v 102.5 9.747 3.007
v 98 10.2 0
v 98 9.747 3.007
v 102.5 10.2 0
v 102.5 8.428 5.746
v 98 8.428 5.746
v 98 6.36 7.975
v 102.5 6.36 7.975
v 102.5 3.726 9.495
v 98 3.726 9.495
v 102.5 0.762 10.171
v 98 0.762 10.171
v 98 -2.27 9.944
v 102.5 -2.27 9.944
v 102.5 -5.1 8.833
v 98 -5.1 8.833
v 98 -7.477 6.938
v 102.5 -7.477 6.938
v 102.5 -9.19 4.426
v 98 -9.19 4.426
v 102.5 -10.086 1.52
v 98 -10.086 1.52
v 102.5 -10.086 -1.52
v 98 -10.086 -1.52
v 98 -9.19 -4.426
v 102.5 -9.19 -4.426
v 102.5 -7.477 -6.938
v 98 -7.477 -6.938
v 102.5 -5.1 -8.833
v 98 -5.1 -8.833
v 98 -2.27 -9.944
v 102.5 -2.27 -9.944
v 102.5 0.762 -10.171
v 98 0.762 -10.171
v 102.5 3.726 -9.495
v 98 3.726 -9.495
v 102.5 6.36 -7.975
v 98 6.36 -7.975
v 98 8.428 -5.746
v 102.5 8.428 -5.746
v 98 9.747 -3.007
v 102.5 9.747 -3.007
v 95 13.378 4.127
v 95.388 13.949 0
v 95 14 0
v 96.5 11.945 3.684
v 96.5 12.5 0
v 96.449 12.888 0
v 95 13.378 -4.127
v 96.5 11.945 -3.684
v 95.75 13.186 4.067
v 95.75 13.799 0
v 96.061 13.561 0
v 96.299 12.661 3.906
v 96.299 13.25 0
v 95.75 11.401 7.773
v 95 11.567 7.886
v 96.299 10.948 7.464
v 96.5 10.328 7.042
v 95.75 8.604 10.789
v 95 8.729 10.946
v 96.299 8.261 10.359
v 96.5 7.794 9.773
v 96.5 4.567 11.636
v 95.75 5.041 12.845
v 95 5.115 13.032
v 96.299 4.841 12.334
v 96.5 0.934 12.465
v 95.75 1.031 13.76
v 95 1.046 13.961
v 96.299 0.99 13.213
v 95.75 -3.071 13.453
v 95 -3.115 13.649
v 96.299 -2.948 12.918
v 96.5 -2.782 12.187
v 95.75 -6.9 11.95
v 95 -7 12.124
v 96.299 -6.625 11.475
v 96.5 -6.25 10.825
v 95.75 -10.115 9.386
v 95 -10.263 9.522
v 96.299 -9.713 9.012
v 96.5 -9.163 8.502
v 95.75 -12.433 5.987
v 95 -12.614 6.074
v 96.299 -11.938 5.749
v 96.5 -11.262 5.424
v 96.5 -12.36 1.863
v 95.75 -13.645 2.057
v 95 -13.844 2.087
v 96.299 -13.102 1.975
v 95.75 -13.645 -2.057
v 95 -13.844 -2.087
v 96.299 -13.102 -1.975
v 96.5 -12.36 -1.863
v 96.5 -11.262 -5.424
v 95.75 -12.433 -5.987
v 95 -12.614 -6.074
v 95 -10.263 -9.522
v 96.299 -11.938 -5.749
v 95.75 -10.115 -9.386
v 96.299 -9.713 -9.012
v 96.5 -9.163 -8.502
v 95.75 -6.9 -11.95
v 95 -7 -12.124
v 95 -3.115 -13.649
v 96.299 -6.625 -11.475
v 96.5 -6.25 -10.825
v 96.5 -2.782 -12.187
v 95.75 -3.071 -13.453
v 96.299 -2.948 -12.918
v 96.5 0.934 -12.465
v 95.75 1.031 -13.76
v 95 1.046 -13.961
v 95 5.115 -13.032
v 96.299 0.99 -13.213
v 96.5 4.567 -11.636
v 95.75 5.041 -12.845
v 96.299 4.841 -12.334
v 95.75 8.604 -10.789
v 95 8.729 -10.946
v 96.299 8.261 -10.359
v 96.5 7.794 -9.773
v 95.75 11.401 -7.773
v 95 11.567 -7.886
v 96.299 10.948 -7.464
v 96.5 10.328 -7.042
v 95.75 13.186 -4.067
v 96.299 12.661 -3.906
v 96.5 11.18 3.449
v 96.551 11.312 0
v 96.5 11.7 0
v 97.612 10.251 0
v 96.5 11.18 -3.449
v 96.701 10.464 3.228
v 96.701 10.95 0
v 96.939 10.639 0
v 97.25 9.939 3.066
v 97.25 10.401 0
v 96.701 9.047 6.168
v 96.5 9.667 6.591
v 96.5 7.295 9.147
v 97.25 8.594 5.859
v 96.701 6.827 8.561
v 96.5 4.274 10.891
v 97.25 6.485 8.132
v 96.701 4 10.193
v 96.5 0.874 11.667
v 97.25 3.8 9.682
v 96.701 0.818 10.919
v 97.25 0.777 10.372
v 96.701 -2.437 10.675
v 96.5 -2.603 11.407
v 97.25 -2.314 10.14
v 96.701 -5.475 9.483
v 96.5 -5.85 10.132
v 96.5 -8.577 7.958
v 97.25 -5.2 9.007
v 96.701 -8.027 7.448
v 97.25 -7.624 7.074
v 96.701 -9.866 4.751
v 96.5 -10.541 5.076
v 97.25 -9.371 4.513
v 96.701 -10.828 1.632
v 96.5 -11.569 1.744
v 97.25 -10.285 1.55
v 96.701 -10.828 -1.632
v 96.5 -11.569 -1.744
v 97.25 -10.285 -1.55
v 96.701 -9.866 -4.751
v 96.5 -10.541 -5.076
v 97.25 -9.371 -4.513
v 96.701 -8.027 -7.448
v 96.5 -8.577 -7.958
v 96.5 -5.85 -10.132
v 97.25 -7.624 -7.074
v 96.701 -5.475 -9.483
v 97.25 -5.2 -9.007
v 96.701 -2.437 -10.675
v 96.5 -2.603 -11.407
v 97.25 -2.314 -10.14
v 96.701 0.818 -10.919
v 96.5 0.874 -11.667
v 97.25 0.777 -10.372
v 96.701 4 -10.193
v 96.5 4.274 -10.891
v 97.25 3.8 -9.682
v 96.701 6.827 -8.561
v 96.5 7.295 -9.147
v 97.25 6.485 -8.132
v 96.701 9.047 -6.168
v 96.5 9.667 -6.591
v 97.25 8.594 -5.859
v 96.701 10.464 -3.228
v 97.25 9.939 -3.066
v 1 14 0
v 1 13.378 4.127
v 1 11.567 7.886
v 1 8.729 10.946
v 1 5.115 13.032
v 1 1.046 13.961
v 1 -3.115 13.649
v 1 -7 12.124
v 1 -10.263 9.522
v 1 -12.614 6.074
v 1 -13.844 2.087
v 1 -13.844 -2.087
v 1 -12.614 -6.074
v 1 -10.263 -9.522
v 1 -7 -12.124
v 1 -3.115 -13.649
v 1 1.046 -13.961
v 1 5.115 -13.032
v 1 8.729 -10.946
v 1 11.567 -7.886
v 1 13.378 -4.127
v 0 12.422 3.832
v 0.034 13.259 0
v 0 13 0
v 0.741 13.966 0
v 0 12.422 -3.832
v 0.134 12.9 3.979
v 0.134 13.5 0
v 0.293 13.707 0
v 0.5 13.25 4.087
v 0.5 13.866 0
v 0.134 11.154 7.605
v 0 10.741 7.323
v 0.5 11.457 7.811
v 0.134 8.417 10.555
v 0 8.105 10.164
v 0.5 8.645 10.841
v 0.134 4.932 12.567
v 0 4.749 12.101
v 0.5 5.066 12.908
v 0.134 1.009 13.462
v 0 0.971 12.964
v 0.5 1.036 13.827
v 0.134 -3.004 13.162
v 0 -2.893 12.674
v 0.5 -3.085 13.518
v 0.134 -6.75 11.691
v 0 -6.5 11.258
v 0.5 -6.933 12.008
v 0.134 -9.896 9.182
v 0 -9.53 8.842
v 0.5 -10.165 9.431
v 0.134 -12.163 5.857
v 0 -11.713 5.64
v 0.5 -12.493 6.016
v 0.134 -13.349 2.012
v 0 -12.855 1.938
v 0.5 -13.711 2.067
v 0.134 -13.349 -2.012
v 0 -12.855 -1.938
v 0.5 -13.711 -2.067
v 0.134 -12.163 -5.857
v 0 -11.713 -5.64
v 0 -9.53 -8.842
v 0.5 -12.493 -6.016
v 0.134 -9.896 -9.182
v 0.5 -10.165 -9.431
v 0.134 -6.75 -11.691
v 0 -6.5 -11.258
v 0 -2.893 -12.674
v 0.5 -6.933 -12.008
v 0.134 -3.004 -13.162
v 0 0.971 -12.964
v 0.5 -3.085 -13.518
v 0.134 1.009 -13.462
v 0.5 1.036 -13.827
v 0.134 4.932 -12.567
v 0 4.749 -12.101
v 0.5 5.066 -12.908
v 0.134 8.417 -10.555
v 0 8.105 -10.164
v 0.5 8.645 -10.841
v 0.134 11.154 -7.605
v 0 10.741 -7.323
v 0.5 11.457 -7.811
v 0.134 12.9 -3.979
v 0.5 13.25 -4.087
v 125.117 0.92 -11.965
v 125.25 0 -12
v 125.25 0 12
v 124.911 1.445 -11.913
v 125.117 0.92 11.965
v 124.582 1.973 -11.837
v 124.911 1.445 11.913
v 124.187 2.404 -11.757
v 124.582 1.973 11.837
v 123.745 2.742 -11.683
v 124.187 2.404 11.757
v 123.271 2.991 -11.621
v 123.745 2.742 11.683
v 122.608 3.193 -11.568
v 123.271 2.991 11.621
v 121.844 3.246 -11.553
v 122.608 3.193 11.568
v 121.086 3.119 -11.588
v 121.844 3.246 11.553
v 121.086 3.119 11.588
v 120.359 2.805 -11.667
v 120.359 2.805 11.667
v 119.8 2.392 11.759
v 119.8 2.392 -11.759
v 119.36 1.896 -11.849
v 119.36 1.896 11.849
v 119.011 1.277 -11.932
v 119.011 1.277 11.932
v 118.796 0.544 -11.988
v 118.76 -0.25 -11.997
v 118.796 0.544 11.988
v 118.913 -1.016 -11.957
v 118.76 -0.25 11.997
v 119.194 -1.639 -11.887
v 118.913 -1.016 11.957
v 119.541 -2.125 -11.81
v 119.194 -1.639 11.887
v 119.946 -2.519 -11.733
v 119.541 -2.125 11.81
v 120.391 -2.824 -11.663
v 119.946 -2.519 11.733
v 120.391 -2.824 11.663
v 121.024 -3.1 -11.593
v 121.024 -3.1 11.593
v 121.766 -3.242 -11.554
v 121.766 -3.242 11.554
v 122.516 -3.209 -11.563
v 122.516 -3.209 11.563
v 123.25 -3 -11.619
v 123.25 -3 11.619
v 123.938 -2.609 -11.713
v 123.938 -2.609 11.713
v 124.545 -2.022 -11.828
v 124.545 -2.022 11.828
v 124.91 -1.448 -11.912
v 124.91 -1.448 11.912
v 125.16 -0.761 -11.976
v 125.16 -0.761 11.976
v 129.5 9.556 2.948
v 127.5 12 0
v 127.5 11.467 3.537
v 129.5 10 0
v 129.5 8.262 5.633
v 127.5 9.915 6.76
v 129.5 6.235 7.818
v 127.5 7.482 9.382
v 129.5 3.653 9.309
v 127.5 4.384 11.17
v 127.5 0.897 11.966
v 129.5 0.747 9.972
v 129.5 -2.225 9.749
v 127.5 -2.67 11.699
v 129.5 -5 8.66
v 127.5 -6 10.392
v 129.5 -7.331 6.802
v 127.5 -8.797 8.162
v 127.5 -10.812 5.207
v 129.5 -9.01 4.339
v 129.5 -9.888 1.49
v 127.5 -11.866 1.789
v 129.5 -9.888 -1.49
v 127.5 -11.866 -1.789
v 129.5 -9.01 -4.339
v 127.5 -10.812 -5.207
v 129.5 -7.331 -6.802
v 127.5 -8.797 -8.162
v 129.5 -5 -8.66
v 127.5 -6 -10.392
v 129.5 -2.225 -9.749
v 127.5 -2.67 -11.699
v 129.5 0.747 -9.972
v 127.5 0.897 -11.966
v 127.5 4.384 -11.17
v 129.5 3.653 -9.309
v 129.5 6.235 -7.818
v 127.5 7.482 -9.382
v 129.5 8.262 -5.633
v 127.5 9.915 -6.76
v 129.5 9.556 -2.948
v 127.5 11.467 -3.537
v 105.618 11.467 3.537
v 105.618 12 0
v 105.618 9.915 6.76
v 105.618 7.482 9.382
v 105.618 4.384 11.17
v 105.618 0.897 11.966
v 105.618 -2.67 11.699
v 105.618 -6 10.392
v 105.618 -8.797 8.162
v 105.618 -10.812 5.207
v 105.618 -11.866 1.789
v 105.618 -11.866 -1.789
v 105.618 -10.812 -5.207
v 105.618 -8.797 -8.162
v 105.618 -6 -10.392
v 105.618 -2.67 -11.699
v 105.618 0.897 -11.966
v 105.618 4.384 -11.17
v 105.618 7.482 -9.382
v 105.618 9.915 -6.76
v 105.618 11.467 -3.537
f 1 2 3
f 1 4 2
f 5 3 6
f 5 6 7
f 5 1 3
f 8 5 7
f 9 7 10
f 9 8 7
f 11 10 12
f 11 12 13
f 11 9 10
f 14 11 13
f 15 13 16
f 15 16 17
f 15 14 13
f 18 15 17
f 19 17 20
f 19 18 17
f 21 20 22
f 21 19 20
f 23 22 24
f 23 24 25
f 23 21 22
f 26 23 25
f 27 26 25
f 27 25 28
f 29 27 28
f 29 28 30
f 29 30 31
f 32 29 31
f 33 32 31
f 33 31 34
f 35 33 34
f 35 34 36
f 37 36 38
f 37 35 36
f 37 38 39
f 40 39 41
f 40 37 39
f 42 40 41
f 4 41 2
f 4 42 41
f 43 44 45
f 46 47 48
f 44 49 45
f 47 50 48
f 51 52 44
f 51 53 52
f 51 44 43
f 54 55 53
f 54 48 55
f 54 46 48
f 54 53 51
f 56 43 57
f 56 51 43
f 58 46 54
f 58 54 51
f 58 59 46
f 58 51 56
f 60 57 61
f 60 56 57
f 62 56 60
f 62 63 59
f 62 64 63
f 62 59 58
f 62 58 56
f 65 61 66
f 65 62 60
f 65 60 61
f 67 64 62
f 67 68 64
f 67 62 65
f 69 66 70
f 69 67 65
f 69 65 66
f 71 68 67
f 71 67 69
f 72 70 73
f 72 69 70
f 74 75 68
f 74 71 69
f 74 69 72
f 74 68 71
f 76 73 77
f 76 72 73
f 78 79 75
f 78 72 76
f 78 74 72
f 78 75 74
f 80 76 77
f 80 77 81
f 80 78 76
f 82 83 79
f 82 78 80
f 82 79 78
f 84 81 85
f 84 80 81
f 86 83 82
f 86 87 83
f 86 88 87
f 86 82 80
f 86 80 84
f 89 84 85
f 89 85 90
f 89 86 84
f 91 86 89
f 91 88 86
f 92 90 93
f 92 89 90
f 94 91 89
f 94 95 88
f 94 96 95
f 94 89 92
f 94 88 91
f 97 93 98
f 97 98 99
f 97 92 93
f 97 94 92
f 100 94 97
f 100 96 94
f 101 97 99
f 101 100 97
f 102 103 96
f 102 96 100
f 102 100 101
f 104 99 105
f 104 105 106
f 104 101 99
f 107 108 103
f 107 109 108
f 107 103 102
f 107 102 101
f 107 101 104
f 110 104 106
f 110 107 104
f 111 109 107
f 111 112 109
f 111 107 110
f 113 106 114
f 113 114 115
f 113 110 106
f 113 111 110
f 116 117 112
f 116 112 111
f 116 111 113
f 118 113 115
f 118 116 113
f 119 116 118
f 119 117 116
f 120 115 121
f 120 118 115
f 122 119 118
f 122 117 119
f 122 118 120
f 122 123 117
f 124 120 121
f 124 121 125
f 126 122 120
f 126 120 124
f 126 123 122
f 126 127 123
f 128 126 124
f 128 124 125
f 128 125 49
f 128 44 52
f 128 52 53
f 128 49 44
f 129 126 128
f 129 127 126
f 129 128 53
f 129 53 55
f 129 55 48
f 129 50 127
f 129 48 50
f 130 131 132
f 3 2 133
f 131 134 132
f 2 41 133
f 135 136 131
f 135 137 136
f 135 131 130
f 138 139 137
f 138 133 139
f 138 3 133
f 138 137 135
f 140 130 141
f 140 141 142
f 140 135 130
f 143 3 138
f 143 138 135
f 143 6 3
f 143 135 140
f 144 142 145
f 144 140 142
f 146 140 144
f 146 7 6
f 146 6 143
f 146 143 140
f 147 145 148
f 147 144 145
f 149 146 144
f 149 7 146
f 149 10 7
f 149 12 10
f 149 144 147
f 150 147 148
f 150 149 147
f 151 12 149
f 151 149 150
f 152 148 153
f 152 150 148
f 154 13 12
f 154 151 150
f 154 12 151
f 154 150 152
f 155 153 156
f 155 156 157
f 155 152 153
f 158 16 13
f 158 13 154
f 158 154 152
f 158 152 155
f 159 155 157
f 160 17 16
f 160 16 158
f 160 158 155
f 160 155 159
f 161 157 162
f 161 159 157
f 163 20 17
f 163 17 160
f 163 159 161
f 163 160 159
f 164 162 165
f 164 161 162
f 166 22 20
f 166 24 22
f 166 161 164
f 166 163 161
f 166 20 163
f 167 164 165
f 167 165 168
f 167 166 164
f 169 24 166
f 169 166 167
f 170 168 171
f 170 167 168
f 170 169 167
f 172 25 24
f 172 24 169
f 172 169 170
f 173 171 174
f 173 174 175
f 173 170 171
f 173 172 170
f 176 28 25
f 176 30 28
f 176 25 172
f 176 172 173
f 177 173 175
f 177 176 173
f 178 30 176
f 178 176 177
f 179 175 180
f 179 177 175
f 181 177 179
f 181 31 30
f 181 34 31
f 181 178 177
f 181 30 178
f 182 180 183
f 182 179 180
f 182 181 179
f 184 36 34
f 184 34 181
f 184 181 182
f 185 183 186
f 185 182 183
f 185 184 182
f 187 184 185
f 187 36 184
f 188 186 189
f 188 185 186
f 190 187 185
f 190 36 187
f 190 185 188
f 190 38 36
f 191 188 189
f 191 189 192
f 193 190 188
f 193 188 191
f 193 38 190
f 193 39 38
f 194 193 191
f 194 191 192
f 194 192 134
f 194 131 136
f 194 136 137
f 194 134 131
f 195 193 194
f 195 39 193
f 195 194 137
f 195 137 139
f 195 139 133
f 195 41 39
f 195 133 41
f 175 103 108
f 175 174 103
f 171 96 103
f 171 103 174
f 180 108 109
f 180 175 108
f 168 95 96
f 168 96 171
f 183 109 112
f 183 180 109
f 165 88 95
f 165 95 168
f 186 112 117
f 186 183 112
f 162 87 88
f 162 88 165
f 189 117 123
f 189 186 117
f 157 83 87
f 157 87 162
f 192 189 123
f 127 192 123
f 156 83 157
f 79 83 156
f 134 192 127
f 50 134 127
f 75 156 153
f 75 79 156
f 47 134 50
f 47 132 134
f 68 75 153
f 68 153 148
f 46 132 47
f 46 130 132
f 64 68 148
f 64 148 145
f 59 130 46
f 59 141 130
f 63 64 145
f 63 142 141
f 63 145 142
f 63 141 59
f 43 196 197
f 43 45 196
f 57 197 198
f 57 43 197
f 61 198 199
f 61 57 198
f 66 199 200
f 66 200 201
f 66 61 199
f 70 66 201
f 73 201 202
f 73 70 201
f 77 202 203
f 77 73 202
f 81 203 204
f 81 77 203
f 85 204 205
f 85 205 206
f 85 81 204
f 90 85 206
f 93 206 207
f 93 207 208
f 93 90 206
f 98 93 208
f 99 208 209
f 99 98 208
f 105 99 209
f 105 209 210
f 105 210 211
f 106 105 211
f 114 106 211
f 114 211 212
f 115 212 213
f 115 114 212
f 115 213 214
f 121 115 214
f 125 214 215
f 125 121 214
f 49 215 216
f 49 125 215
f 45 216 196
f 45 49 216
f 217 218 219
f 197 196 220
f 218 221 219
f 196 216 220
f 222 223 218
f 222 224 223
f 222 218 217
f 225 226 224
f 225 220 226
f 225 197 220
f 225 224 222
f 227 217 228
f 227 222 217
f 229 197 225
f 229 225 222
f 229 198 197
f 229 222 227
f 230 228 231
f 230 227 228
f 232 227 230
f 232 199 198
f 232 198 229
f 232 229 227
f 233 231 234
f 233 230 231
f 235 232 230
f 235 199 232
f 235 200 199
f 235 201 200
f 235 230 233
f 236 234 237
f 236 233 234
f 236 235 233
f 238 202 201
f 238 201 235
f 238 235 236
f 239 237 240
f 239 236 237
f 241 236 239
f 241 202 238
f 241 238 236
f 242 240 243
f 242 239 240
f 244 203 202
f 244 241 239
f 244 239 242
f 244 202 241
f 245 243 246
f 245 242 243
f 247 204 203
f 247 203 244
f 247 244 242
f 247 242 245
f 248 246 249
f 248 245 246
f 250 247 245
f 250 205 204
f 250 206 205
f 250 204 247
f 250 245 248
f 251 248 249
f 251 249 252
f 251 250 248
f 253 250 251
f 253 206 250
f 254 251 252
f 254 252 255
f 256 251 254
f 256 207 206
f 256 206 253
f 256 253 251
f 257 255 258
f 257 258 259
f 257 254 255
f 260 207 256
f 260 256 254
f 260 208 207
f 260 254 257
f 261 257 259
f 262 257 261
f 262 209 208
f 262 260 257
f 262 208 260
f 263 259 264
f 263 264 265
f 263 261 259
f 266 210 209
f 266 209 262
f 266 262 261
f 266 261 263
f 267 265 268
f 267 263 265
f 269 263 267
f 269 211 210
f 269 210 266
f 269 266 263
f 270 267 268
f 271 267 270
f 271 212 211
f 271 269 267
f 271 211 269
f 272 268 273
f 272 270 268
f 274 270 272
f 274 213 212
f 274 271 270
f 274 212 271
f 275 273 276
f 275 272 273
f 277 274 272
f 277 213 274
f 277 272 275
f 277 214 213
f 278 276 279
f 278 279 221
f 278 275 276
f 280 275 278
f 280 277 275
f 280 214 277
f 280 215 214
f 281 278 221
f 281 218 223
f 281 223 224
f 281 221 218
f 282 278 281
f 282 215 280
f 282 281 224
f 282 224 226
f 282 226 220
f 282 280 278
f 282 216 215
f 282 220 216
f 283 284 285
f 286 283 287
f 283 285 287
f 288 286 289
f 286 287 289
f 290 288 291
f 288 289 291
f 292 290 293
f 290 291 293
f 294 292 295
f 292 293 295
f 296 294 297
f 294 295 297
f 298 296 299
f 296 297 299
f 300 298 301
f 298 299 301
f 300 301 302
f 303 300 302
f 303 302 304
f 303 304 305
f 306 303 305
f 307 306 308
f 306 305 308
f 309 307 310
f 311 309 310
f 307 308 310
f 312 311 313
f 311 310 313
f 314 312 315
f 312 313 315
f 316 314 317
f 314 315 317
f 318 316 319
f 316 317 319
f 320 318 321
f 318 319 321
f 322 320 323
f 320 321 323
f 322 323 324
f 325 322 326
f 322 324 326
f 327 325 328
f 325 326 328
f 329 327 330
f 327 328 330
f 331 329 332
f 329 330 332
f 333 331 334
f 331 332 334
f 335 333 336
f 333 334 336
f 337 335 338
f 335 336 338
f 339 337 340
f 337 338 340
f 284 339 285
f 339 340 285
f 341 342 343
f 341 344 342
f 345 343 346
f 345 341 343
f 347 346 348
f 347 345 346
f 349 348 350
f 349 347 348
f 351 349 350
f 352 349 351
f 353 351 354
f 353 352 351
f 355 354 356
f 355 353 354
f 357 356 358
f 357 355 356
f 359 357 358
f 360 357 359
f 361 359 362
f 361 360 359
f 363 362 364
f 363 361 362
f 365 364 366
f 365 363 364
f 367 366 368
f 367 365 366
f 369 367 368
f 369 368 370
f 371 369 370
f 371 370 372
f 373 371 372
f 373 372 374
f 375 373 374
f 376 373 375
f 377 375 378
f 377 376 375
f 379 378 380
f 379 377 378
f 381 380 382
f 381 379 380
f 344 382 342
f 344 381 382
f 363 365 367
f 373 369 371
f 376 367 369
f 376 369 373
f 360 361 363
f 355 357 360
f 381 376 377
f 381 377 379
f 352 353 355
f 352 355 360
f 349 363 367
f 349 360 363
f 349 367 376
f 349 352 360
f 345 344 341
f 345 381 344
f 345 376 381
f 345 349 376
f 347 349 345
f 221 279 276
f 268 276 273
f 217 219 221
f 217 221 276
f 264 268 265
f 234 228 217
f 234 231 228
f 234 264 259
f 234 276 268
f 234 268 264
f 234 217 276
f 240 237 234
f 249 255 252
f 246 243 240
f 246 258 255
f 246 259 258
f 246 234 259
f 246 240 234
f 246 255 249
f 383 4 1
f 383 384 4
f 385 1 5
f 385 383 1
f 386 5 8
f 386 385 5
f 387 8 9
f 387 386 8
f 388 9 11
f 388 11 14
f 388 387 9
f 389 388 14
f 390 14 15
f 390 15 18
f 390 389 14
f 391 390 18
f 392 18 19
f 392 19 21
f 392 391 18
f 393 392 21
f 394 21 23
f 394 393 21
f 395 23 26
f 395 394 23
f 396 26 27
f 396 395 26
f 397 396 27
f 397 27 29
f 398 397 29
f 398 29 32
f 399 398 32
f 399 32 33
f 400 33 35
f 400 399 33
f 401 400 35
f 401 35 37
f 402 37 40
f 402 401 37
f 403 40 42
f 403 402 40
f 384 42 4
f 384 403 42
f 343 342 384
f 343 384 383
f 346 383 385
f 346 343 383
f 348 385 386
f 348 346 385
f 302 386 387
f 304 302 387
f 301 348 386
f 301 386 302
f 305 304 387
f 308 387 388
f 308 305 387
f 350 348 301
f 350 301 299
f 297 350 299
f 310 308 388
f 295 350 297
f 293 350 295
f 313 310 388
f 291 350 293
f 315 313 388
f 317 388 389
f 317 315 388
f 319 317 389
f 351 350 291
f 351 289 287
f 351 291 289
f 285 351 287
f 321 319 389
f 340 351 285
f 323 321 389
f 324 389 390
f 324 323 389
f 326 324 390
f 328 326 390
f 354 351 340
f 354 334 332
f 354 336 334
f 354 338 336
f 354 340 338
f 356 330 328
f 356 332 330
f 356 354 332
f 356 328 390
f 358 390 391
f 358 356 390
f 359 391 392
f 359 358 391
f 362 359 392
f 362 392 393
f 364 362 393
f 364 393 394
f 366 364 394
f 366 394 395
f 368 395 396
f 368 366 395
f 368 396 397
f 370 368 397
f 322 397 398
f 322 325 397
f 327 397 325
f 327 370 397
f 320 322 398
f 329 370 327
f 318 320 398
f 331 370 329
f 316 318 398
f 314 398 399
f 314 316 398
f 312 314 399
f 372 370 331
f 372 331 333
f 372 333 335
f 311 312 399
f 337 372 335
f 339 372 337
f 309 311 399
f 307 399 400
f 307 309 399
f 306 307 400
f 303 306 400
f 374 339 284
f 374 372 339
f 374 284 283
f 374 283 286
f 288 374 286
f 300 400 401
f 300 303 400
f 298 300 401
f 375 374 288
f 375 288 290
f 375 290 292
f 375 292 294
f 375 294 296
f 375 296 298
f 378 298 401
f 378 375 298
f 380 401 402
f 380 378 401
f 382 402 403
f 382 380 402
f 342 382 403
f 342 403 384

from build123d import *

# Parameters (mm, degrees)
SKETCH2_R       = 3.25
F_6_5_HUL_DEPTH = 25


with BuildPart() as part:
    # Sketch1 → Base-Revolve (revolve)
    with BuildSketch(Plane.XY):
        with BuildLine():
            Line((1, 14), (95, 14))
            ThreePointArc((95, 14), (96.060660172, 13.560660172), (96.5, 12.5))
            Line((96.5, 12.5), (96.5, 11.7))
            ThreePointArc((96.5, 11.7), (96.939339828, 10.639339828), (98, 10.2))
            Line((98, 10.2), (102.5, 10.2))
            Line((102.5, 10.2), (105.617691454, 12))
            Line((105.617691454, 12), (127.5, 12))
            Line((127.5, 12), (129.5, 10))
            Line((129.5, 10), (129.5, 0))
            Line((129.5, 0), (0, 0))
            Line((0, 0), (0, 13))
            ThreePointArc((0, 13), (0.292893219, 13.707106781), (1, 14))
        make_face()
    revolve(axis=Axis((-12.994157099, 0, 0), (1, 0, 0)))

    # Sketch2 → ø6.5 hul (cut, symmetric)
    with BuildSketch(Plane.XY):
        with Locations((122, 0)):
            Circle(SKETCH2_R)
    extrude(amount=F_6_5_HUL_DEPTH, both=True, mode=Mode.SUBTRACT)


solid = part.part
